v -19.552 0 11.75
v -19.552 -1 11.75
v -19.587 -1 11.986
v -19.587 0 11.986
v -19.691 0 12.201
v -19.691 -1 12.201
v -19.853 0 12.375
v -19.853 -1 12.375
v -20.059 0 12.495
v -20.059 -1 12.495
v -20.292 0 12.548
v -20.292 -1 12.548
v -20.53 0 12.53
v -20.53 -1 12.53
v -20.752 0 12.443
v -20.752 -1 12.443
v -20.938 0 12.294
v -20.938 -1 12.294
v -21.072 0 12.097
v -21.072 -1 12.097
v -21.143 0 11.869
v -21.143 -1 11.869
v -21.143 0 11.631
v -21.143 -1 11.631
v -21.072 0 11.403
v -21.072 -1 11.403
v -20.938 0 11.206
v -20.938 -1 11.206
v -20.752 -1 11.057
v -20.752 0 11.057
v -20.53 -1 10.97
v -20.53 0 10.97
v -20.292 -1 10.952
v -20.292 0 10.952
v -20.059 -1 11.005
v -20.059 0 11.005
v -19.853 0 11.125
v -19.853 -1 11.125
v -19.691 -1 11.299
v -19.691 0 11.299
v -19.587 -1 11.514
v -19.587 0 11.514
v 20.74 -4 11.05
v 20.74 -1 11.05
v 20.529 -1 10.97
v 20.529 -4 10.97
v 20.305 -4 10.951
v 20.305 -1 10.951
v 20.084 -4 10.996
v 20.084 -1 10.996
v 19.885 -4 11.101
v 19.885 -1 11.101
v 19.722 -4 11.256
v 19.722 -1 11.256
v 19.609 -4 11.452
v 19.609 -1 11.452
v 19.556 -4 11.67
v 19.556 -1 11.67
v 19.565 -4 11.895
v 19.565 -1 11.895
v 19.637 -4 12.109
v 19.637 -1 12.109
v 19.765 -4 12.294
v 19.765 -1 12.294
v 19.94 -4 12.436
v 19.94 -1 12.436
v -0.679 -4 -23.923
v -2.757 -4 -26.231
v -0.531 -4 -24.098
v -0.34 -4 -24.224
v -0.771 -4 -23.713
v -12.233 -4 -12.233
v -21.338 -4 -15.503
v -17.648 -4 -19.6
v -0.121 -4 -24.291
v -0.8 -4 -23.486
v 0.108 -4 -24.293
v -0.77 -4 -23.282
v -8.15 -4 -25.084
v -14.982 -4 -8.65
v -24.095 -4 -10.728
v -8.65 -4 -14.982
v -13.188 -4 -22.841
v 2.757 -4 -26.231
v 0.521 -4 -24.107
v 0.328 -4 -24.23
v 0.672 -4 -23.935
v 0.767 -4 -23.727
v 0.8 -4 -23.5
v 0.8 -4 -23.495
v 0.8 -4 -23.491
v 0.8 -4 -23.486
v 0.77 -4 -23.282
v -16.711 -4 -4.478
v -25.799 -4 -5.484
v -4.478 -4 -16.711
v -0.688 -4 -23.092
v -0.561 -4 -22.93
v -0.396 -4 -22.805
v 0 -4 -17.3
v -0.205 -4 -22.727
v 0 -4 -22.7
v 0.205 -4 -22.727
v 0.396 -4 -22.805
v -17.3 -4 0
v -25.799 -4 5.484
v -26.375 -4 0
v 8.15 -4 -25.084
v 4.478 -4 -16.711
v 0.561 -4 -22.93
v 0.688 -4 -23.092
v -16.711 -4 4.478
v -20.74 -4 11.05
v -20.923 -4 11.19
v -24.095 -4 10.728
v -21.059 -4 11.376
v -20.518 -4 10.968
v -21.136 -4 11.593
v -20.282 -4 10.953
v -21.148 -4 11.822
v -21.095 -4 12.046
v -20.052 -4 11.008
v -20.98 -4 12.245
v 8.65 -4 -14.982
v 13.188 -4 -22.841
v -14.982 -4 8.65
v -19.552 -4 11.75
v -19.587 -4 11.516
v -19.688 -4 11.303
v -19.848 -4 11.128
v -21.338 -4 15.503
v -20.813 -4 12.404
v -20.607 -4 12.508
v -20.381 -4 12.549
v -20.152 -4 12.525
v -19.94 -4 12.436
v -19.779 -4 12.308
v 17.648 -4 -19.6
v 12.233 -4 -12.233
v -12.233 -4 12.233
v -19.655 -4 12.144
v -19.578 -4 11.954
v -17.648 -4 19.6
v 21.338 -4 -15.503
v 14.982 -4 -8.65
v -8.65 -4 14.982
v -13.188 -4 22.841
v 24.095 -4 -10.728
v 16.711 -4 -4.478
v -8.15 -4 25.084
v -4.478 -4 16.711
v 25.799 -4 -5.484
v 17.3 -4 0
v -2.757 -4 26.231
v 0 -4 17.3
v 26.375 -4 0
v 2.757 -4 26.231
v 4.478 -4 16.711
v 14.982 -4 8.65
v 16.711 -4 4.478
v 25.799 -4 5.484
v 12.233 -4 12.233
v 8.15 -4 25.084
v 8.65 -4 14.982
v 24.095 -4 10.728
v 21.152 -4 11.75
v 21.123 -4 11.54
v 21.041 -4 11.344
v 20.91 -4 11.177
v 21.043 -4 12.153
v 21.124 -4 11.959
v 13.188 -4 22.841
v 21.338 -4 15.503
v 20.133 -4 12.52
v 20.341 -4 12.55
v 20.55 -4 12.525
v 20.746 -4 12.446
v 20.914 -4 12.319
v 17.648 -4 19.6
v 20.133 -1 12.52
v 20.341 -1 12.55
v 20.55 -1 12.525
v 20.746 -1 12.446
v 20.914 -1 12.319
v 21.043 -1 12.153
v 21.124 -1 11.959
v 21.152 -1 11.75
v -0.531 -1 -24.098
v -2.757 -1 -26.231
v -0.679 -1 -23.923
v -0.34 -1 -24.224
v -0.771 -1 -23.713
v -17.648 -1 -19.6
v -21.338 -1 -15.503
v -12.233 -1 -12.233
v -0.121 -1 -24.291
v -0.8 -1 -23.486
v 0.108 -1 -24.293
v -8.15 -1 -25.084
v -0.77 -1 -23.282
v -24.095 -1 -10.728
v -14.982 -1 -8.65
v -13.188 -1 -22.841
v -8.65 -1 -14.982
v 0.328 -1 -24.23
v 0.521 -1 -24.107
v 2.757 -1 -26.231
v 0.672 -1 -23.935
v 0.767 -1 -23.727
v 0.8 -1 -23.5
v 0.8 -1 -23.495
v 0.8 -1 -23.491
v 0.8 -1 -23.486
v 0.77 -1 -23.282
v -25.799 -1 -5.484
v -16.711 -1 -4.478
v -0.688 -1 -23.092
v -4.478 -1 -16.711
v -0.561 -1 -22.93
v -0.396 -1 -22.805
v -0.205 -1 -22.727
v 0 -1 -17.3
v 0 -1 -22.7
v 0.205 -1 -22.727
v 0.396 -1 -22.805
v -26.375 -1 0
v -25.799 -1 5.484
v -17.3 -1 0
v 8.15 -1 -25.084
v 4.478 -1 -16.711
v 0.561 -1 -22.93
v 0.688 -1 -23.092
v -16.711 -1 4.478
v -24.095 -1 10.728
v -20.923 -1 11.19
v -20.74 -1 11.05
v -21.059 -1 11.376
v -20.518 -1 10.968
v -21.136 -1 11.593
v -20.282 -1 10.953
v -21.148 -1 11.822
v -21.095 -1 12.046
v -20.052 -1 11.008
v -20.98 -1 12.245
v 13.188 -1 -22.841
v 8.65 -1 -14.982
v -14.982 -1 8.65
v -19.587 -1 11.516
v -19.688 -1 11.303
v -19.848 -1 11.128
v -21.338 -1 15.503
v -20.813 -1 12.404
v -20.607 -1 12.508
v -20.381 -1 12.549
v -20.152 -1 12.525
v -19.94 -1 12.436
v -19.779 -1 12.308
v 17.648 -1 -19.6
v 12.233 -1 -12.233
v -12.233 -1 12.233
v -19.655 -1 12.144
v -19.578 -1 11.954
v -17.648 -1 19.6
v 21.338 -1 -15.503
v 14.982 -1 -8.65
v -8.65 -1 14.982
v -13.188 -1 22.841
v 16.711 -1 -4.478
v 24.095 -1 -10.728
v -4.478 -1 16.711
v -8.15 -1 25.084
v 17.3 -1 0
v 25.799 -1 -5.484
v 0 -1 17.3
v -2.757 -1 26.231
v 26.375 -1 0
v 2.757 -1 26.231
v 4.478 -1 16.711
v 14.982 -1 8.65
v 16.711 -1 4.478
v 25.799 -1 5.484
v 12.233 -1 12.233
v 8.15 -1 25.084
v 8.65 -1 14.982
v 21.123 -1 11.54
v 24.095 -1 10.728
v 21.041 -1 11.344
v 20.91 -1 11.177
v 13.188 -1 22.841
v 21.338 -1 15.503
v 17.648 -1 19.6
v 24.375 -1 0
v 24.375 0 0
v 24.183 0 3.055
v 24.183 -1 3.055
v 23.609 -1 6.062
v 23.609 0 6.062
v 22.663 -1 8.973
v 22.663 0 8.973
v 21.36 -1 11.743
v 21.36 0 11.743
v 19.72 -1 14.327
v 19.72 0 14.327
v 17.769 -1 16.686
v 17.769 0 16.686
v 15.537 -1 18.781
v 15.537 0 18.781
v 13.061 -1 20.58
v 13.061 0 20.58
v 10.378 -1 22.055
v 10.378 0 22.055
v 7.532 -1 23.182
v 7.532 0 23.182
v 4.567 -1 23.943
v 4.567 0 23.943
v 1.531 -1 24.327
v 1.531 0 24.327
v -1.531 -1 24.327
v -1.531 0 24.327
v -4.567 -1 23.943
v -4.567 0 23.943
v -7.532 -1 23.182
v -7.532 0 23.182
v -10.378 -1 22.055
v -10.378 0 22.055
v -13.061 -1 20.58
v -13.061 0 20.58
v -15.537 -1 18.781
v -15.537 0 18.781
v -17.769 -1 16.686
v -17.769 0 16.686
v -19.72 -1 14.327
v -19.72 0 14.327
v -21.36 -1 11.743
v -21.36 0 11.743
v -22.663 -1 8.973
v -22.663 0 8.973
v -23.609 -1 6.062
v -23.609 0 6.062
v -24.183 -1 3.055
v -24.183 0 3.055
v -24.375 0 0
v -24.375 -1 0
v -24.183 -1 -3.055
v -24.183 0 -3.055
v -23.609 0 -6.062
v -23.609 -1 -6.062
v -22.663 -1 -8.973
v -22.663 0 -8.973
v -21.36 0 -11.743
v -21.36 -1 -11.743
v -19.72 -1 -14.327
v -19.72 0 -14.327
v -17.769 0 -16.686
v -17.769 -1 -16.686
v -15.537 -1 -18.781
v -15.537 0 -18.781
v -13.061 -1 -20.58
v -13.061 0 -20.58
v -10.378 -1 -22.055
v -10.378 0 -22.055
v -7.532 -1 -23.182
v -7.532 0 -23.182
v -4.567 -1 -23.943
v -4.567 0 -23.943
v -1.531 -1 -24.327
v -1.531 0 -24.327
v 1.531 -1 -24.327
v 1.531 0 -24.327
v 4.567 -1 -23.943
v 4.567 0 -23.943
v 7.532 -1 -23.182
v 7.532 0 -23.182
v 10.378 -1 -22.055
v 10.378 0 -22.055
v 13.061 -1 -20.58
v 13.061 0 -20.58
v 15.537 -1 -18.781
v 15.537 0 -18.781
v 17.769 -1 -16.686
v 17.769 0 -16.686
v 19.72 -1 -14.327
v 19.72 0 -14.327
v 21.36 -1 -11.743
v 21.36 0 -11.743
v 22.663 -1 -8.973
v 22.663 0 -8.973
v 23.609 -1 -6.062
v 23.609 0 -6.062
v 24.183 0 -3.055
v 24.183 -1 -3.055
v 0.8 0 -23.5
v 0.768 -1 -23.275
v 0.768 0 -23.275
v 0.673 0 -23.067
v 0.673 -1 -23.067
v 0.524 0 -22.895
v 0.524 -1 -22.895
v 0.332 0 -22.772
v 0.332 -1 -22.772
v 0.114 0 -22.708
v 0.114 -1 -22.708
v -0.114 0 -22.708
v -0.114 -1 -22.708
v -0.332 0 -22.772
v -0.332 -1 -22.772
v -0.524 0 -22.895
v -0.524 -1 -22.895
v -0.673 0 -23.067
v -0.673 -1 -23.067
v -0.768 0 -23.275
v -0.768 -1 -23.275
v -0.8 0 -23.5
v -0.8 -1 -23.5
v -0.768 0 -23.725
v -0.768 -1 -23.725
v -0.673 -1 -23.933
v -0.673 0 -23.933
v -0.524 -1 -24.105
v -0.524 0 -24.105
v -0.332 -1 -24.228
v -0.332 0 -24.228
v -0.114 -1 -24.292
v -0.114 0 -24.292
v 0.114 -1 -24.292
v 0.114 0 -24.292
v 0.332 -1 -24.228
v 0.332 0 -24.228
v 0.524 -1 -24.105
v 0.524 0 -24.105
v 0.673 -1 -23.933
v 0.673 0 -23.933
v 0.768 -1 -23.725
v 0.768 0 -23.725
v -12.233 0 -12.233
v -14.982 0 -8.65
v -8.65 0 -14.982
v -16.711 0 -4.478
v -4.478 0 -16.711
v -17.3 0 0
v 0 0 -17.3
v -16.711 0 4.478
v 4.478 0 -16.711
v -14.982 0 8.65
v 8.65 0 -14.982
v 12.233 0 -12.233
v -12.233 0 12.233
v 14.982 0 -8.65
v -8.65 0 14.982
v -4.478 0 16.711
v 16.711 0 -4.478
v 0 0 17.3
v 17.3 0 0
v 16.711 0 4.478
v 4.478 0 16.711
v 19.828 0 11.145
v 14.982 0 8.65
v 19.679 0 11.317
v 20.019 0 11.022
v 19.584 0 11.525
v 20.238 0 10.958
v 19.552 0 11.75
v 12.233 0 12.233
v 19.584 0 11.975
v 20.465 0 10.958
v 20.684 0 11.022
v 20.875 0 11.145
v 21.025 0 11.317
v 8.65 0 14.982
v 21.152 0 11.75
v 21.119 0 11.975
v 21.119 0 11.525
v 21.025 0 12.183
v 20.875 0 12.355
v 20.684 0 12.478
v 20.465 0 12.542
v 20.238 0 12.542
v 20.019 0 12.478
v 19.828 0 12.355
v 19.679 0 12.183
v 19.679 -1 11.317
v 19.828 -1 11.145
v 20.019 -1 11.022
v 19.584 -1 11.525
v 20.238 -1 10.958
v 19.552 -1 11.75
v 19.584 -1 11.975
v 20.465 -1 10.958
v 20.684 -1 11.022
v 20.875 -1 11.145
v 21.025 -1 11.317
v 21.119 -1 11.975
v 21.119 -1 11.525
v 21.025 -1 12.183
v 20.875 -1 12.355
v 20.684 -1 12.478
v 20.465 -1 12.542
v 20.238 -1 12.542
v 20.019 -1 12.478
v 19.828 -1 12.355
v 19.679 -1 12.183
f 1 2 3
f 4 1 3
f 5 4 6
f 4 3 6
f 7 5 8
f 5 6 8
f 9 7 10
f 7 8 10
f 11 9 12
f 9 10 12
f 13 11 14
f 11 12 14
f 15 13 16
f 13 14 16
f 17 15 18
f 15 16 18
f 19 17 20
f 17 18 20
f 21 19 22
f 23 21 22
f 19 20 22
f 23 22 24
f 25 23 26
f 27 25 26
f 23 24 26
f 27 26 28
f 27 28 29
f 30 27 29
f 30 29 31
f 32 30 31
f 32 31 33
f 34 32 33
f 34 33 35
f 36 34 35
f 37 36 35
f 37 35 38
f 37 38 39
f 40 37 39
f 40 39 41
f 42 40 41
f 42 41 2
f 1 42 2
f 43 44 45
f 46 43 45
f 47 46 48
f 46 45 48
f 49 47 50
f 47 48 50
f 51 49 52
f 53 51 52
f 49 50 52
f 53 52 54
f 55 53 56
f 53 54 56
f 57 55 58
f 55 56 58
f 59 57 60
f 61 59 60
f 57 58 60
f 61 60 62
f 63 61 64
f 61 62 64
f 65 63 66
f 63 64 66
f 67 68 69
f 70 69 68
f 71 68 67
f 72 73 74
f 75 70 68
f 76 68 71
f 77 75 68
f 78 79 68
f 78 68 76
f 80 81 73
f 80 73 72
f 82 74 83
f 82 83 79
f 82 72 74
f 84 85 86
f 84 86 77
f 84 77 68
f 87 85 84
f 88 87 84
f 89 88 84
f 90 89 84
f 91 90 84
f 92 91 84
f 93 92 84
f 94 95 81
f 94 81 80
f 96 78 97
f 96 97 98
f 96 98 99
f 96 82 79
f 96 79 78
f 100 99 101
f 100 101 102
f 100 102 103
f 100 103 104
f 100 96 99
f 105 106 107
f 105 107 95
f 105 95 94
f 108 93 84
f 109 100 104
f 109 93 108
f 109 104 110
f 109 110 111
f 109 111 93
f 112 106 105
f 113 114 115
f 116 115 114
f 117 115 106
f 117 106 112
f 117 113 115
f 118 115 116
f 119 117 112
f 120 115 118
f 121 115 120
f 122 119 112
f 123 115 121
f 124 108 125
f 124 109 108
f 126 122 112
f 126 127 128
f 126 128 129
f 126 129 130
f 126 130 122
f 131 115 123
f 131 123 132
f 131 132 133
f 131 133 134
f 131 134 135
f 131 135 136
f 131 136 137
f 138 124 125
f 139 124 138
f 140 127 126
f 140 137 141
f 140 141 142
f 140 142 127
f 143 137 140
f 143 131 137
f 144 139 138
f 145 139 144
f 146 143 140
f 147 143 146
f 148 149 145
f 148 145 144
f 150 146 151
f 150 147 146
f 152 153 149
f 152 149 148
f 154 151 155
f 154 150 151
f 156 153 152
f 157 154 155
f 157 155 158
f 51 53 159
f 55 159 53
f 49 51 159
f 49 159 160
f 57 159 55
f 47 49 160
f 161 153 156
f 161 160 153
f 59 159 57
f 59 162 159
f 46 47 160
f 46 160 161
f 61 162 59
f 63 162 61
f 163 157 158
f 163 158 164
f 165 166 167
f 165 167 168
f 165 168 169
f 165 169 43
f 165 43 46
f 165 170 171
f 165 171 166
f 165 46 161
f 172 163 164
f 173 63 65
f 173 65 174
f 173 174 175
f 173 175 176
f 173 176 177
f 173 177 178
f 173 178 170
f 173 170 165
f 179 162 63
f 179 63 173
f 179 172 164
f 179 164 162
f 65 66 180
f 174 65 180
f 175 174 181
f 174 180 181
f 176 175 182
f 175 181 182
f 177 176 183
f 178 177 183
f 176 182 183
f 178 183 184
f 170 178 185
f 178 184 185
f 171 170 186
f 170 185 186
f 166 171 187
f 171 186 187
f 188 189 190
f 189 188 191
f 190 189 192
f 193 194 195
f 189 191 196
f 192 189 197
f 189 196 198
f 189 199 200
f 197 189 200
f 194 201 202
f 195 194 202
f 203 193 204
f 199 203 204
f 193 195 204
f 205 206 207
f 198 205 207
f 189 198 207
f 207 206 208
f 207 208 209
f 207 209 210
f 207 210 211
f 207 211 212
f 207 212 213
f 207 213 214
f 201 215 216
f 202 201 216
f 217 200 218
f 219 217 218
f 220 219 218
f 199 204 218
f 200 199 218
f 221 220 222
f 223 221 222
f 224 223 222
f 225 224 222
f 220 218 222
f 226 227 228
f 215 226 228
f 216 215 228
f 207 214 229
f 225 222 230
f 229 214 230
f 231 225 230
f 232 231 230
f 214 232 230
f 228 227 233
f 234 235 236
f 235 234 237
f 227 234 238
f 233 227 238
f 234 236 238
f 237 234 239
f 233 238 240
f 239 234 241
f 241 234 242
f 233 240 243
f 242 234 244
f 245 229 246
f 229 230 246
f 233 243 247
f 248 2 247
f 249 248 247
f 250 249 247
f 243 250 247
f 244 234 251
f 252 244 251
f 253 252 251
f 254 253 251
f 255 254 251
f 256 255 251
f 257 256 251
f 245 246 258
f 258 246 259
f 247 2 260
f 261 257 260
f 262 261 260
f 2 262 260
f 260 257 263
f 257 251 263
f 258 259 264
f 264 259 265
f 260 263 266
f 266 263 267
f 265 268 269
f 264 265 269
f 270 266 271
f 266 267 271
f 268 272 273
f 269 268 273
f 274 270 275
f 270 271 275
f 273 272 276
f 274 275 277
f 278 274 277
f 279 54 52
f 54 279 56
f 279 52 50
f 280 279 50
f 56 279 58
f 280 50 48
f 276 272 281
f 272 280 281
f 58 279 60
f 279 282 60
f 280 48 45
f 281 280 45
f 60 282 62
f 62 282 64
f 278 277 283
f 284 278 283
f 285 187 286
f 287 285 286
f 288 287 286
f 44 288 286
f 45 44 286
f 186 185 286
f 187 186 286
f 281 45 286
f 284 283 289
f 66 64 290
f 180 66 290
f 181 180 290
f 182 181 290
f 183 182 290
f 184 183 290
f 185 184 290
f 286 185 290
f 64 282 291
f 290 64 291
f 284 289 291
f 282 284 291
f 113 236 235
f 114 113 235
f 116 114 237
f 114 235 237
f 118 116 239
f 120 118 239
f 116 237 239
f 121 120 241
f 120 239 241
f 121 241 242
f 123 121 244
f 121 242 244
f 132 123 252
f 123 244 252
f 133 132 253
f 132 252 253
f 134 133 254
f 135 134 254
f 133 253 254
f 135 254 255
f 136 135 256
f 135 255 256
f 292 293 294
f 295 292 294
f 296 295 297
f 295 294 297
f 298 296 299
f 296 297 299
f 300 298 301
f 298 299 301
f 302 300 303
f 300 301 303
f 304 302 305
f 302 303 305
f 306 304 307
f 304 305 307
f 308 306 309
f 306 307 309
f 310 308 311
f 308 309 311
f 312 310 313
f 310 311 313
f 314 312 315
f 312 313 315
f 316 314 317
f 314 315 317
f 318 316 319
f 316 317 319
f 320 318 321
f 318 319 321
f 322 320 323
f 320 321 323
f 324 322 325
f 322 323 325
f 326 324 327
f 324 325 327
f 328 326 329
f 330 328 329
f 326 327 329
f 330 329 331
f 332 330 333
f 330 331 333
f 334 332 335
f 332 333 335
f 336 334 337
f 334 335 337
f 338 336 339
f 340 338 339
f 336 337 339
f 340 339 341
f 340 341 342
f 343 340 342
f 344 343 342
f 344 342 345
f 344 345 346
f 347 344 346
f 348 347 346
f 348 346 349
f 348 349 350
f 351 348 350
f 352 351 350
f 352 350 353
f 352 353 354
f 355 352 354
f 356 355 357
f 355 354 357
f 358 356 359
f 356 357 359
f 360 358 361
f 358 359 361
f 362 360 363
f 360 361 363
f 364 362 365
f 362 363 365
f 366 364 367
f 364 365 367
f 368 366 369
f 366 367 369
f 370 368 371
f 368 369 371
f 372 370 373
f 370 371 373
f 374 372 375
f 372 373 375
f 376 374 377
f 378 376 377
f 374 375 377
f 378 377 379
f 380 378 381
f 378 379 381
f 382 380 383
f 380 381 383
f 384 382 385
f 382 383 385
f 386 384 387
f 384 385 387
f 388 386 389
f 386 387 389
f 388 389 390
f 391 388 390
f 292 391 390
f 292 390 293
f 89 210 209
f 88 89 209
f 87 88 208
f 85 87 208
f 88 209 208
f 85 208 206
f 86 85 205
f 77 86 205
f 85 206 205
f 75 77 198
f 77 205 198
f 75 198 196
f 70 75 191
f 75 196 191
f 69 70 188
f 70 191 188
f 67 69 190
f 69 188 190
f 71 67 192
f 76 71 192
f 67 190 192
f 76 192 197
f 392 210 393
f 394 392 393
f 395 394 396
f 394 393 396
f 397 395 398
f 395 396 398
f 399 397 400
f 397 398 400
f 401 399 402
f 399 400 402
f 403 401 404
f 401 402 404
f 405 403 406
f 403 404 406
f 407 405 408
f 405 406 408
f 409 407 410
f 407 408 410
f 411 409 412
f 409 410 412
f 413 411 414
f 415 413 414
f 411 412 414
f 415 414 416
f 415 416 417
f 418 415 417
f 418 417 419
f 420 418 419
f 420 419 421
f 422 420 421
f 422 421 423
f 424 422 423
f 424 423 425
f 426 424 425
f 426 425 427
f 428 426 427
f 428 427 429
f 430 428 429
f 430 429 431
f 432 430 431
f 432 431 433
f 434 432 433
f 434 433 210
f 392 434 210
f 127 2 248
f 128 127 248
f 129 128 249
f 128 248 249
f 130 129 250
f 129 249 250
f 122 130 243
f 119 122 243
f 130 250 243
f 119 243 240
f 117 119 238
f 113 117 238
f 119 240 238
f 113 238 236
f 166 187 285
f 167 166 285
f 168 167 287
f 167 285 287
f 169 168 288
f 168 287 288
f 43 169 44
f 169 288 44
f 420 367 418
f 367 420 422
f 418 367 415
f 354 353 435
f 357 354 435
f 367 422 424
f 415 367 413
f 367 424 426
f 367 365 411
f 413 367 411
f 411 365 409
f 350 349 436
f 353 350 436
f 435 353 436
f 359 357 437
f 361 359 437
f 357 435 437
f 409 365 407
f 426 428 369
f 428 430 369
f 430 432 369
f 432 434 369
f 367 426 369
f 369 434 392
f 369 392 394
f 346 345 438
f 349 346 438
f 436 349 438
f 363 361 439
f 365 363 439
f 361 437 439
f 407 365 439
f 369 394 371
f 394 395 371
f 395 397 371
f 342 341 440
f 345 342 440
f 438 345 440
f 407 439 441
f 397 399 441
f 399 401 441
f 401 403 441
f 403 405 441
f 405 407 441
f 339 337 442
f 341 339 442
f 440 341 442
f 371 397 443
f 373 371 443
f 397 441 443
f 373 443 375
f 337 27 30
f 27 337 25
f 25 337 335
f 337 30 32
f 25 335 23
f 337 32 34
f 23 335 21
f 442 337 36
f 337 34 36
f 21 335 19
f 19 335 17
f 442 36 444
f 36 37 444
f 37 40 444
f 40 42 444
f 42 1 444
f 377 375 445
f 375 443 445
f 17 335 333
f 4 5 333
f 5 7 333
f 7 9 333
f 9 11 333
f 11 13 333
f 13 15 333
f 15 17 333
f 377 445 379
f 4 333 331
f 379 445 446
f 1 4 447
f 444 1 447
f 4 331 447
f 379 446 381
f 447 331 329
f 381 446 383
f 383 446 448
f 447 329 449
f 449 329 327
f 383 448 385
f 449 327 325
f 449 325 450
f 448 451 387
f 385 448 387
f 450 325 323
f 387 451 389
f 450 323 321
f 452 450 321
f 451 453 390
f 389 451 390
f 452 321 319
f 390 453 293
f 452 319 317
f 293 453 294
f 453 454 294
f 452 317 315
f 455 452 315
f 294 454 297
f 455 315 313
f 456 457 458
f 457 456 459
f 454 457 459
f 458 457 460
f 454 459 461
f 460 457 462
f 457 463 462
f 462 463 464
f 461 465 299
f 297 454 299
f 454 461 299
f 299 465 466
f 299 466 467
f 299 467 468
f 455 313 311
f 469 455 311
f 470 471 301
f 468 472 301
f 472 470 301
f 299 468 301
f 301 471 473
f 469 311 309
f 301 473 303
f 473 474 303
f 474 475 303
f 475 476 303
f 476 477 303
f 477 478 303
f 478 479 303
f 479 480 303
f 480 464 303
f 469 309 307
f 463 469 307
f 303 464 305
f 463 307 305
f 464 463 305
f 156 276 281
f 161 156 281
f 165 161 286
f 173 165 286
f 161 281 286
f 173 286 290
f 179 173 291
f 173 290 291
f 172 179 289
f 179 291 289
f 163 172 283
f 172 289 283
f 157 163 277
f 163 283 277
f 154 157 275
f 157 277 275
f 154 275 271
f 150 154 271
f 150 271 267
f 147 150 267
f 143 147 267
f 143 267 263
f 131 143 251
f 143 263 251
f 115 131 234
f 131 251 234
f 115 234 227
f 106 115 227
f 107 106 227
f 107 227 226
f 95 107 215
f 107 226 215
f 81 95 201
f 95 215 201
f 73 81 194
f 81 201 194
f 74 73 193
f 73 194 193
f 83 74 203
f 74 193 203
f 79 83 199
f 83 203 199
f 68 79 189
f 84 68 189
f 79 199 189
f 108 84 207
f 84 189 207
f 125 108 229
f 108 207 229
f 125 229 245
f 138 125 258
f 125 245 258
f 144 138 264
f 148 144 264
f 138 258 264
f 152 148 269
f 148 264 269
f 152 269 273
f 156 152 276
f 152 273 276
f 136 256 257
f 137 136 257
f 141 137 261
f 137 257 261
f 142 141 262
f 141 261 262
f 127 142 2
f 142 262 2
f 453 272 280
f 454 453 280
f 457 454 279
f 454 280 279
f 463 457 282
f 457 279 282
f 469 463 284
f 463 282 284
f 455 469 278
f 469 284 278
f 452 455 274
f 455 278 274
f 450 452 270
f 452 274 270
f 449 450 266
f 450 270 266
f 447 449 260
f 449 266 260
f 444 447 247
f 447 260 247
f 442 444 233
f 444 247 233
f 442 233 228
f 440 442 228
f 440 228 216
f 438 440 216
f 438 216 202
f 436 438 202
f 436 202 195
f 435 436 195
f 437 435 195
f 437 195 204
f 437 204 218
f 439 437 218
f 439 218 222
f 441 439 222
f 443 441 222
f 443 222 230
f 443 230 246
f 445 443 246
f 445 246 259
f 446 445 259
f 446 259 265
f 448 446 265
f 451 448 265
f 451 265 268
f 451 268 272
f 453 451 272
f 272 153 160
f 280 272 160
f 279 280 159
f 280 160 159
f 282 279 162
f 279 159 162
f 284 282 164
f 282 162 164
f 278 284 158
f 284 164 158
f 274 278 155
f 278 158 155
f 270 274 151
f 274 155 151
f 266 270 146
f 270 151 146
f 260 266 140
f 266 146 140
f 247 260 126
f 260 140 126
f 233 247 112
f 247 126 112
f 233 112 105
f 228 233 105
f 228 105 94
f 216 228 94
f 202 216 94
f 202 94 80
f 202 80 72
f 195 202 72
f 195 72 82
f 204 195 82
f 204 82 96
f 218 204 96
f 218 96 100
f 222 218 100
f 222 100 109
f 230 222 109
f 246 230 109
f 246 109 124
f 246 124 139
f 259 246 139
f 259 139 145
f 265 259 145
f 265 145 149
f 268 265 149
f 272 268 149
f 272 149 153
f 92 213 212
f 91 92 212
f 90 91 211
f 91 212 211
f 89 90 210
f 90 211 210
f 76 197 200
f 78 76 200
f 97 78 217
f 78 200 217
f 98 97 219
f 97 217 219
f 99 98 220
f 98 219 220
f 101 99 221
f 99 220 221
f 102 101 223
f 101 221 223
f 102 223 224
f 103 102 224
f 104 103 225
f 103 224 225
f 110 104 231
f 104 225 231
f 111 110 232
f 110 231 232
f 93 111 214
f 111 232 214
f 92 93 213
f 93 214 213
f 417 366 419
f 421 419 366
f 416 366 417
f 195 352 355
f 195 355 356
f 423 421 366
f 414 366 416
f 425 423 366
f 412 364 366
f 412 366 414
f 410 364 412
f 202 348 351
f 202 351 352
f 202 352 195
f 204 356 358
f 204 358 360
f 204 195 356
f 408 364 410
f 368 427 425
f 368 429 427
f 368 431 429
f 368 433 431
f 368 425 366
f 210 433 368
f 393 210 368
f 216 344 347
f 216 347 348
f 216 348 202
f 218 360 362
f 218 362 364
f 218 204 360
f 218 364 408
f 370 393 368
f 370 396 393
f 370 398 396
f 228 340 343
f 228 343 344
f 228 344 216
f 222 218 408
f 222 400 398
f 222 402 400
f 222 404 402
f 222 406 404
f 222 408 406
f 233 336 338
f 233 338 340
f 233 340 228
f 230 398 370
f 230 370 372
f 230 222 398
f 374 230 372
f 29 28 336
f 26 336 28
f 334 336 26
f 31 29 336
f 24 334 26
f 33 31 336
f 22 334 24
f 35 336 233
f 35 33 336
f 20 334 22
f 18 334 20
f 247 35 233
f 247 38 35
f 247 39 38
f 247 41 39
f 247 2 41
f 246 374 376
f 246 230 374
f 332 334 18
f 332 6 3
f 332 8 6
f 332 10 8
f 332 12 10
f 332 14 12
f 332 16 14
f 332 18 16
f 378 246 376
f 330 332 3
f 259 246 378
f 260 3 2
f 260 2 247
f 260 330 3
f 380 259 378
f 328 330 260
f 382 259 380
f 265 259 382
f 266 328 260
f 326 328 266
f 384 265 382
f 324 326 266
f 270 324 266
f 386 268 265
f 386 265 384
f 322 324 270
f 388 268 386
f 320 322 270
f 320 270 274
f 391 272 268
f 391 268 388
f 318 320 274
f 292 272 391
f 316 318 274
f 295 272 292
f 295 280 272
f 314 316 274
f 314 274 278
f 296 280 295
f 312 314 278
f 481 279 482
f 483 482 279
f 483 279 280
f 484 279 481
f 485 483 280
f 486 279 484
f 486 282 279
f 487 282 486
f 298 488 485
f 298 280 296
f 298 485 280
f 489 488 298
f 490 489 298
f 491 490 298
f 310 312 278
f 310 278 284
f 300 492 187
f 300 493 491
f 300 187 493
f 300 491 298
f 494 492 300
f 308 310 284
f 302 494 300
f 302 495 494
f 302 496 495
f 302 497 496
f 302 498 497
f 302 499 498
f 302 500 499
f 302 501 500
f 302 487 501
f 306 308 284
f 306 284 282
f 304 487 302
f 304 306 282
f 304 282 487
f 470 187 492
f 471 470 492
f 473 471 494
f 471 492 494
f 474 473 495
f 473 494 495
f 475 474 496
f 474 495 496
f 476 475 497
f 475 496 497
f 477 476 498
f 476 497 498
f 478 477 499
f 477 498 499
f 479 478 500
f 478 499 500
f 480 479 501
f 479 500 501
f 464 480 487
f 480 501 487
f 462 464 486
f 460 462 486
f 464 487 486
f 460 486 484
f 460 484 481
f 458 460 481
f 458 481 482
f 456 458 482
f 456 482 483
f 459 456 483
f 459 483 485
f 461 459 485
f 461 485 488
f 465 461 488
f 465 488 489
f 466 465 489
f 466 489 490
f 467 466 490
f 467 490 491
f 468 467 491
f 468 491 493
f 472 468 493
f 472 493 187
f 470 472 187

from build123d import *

# Parameters (mm, degrees)
F0_R     = 24.375
F1_DEPTH = 1
F2_R     = 26.375
F2_R_2   = 24.375
F3_DEPTH = 3
F4_R     = 0.8
F5_DEPTH = 25
F6_R     = 17.3
F7_DEPTH = 25


with BuildPart() as f1:
    # F0 (on Front) → F1 (new body)
    with BuildSketch(Plane.XZ):
        Circle(F0_R)
    extrude(amount=F1_DEPTH)

    # F4 (on face) → F5 (cut)
    with BuildSketch(Plane.XZ.offset(4)):
        with Locations((-20.3515969889, 11.75)):
            Circle(F4_R)
        with Locations((20.3515969889, 11.75)):
            Circle(F4_R)
        with Locations((0, -23.5)):
            Circle(F4_R)
    extrude(amount=-F5_DEPTH, mode=Mode.SUBTRACT)


with BuildPart() as f3:
    # F2 (on face) → F3 (new body)
    with BuildSketch(Plane.XZ.offset(1)):
        Circle(F2_R)
        Circle(F2_R_2, mode=Mode.SUBTRACT)
        Circle(F2_R_2)
        with BuildLine():
            ThreePointArc((23.5, 0), (16.897444724, -16.331759299), (0.7998841021, -23.4863829787))
            ThreePointArc((0.7998841021, -23.4863829787), (0.799971025, -23.4931912428), (0.8, -23.5))
            ThreePointArc((0.8, -23.5), (-0.0068087572, -24.299971025), (-0.7998841021, -23.4863829787))
            ThreePointArc((-0.7998841021, -23.4863829787), (-20.3515969889, -11.75), (-20.7397463536, 11.0504715369))
            ThreePointArc((-20.7397463536, 11.0504715369), (-21.044417312, 12.15), (-19.9398622516, 12.4359114418))
            ThreePointArc((-19.9398622516, 12.4359114418), (0, 23.5), (19.9398622516, 12.4359114418))
            ThreePointArc((19.9398622516, 12.4359114418), (20.7456859447, 12.4461996086), (21.1515969889, 11.75))
            ThreePointArc((21.1515969889, 11.75), (21.0409878402, 11.3441179308), (20.7397463536, 11.0504715369))
            ThreePointArc((20.7397463536, 11.0504715369), (22.7994960395, 5.6949960795), (23.5, 0))
        make_face(mode=Mode.SUBTRACT)
        with BuildLine():
            ThreePointArc((-0.7998841021, -23.4863829787), (-0.5608504181, -22.9295205451), (0, -22.7))
            ThreePointArc((0, -22.7), (0.5608504181, -22.9295205451), (0.7998841021, -23.4863829787))
            ThreePointArc((0.7998841021, -23.4863829787), (16.897444724, -16.331759299), (23.5, 0))
            ThreePointArc((23.5, 0), (22.7994960395, 5.6949960795), (20.7397463536, 11.0504715369))
            ThreePointArc((20.7397463536, 11.0504715369), (19.6587766659, 11.35), (19.9398622516, 12.4359114418))
            ThreePointArc((19.9398622516, 12.4359114418), (0, 23.5), (-19.9398622516, 12.4359114418))
            ThreePointArc((-19.9398622516, 12.4359114418), (-19.6553973804, 12.1440889558), (-19.5515969889, 11.75))
            ThreePointArc((-19.5515969889, 11.75), (-19.9457149197, 11.0606091487), (-20.7397463536, 11.0504715369))
            ThreePointArc((-20.7397463536, 11.0504715369), (-20.3515969889, -11.75), (-0.7998841021, -23.4863829787))
        make_face()
        with BuildLine():
            ThreePointArc((0, -22.375), (-15.821514229, 15.821514229), (22.375, 0))
            ThreePointArc((22.375, 0), (15.821514229, -15.821514229), (0, -22.375))
        make_face(mode=Mode.SUBTRACT)
        with BuildLine():
            ThreePointArc((0, -22.375), (15.821514229, -15.821514229), (22.375, 0))
            ThreePointArc((22.375, 0), (-15.821514229, 15.821514229), (0, -22.375))
        make_face()
    extrude(amount=F3_DEPTH)


with BuildPart() as f7_tool:
    # F6 (on face) → F7 (new body)
    with BuildSketch(Plane.XZ.offset(4)):
        Circle(F6_R)
    extrude(amount=-F7_DEPTH)


with BuildPart() as f1_1:
    add(f1.part)

    # F7: cut by f7_tool
    add(f7_tool.part, mode=Mode.SUBTRACT)


with BuildPart() as f3_1:
    add(f3.part)

    # F7: cut by f7_tool
    add(f7_tool.part, mode=Mode.SUBTRACT)


solid = Compound([f1_1.part, f3_1.part])
